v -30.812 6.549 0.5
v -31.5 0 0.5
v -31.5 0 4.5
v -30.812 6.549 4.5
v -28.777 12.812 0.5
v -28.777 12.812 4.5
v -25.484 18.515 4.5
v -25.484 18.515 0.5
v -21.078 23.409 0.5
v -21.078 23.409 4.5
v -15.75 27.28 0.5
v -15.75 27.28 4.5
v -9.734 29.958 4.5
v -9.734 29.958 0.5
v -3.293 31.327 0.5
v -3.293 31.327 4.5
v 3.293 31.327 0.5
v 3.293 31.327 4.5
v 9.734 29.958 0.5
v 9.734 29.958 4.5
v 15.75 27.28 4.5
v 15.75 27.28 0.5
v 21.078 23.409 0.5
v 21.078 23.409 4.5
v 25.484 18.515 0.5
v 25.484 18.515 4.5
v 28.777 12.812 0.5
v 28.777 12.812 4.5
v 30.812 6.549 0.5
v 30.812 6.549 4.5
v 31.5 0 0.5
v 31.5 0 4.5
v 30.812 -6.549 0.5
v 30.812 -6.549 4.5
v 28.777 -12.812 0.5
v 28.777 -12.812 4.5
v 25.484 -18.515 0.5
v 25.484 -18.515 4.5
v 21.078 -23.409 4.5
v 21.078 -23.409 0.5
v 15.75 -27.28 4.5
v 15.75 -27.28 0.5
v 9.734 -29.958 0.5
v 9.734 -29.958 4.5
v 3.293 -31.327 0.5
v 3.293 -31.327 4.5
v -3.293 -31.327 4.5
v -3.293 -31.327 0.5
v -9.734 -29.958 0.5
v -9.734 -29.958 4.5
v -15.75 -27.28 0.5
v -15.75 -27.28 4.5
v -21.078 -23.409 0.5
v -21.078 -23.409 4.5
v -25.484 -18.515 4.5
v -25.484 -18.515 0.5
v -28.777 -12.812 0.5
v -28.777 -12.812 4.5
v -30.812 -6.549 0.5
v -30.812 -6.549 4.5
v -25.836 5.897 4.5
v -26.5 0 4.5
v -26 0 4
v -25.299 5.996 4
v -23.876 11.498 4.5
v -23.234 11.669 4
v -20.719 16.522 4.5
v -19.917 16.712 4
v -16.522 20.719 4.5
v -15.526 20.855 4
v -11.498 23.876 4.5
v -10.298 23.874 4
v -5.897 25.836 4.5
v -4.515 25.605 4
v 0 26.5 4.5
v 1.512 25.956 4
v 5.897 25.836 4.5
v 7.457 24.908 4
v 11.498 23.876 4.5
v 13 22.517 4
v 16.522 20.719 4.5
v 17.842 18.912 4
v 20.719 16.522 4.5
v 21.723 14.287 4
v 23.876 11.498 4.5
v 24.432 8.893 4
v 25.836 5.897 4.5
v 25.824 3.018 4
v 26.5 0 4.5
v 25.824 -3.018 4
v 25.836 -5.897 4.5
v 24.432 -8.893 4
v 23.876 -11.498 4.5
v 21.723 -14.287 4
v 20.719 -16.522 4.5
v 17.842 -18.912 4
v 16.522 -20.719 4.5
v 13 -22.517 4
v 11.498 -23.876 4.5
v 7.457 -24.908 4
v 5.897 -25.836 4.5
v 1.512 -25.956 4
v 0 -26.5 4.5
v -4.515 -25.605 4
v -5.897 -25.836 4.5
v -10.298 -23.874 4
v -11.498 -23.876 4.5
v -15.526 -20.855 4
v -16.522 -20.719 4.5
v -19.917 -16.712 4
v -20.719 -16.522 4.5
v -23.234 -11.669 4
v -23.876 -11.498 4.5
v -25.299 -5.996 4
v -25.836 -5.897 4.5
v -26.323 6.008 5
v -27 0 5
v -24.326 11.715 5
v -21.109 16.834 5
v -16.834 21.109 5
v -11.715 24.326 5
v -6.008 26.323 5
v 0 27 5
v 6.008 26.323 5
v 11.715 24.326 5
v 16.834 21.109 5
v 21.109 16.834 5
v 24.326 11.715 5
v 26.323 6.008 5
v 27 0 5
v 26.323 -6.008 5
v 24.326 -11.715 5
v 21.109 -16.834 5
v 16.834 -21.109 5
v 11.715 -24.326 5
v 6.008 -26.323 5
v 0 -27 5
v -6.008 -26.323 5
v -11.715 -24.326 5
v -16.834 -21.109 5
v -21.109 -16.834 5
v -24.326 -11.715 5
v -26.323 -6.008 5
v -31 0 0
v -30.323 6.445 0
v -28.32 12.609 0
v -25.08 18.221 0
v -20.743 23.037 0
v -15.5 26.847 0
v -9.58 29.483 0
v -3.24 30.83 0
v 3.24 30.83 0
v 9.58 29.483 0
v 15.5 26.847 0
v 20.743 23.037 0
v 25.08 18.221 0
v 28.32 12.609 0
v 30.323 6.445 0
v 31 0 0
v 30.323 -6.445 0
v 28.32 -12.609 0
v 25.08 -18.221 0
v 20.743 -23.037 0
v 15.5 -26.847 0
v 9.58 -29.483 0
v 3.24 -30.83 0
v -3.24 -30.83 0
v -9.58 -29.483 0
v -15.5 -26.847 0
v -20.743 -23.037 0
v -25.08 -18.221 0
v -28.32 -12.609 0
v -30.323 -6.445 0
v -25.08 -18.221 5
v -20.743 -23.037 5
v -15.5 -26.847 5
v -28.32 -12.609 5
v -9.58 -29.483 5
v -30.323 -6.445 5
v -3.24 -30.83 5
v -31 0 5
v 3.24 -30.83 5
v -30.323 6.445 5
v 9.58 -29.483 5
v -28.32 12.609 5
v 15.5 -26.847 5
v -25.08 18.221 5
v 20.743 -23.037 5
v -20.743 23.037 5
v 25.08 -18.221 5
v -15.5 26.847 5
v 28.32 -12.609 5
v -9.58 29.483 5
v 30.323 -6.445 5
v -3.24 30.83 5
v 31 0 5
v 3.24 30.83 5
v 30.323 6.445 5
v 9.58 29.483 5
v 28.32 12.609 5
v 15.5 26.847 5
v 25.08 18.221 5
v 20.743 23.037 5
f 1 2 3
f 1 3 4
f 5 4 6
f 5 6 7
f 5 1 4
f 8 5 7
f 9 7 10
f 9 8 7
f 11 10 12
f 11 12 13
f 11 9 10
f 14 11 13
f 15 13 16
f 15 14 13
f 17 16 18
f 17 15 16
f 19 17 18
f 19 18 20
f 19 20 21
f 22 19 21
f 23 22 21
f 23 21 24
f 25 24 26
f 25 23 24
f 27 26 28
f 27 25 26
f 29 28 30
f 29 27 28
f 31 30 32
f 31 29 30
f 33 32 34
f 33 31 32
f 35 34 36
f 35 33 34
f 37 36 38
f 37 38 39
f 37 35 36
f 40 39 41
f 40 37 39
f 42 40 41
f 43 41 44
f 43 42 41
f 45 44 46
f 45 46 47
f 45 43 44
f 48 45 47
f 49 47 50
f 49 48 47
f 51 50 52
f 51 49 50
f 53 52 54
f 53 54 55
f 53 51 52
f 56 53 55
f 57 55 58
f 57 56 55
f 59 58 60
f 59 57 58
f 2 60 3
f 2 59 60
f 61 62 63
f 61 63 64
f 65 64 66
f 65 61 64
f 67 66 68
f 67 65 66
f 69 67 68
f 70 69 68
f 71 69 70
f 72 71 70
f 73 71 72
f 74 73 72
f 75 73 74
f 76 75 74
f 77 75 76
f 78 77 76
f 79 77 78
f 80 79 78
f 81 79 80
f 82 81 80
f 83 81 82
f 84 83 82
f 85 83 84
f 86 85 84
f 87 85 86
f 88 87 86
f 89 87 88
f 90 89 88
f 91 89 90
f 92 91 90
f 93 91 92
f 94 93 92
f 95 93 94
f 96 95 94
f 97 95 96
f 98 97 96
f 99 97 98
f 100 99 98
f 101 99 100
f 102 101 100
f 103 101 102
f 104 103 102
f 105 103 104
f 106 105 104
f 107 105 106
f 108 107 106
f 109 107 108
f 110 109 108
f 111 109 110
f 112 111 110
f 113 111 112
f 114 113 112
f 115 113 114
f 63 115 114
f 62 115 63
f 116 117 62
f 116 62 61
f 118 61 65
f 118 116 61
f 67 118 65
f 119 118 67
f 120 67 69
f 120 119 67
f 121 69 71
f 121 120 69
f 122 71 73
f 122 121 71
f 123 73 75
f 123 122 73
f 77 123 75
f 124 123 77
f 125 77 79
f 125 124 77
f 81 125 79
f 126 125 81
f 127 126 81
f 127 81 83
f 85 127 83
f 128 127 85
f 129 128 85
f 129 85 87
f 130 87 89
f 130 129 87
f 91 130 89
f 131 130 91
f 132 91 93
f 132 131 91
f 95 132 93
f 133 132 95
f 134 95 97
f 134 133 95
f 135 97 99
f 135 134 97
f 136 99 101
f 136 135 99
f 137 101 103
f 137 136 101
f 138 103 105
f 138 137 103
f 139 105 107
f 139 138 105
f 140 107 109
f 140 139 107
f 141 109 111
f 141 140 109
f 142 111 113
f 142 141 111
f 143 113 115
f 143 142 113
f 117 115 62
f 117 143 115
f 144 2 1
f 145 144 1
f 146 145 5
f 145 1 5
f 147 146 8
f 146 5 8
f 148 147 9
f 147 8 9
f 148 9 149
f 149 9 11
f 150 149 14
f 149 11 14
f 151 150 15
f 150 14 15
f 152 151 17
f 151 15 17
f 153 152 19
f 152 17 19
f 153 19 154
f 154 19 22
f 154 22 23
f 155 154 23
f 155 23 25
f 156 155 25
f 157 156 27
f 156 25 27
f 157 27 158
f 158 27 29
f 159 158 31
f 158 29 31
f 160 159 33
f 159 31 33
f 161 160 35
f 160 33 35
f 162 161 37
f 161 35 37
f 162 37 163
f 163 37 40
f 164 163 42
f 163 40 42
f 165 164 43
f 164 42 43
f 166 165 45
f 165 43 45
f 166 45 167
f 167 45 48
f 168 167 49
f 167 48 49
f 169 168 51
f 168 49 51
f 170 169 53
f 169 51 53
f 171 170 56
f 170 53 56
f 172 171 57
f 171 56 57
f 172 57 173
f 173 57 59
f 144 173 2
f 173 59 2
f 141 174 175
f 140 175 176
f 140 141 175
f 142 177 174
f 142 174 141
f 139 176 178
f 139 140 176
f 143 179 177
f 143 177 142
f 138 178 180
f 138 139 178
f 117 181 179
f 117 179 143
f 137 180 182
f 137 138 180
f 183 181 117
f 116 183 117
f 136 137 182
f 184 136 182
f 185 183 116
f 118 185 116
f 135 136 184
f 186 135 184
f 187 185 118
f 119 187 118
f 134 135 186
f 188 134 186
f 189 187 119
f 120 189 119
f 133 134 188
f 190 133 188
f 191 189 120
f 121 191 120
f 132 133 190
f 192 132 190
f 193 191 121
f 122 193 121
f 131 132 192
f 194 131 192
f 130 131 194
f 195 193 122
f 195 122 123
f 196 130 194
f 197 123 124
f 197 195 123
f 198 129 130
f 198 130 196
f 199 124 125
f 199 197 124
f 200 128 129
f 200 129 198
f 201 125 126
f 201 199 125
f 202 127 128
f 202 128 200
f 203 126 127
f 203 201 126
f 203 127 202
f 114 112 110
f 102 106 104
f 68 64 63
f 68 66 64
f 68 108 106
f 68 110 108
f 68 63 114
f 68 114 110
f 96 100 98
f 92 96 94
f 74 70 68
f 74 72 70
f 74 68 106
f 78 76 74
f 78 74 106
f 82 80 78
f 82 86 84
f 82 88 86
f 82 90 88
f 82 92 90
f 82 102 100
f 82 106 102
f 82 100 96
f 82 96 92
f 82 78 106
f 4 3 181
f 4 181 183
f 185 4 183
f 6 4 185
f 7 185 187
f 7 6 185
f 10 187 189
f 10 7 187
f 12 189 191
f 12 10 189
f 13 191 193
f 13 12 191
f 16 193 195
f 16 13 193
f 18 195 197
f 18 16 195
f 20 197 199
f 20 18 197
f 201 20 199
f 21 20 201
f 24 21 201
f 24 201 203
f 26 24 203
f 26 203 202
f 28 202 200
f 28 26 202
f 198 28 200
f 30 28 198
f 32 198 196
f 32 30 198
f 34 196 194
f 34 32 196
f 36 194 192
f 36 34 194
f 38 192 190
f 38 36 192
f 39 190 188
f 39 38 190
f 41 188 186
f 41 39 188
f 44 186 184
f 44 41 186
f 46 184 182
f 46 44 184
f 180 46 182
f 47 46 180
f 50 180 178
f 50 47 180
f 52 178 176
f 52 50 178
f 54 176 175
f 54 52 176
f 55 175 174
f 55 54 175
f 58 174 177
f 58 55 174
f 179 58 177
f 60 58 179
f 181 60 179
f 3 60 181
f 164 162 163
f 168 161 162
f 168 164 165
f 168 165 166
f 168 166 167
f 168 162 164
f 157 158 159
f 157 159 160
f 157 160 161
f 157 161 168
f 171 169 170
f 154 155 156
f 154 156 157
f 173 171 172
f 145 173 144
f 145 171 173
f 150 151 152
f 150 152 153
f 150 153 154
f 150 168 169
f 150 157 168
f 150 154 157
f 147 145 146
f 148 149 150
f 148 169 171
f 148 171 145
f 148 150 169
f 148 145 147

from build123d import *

# Parameters (mm, degrees)
F2_SIZE = 0.49999


# Not quite as in the source:
# - a fillet or chamfer is up to 0.001 mm smaller than in the source, because OpenCascade refuses the exact size


with BuildPart() as f1:
    # F0 (on Front) → F1 (revolve)
    with BuildSketch(Plane.XZ):
        Polygon((-31.5, 0), (0, 0), (0, 4), (-26.5, 4), (-26.5, 5), (-31.5, 5), align=None)
    revolve(axis=Axis((0, 0, 2), (0, 0, -1)))

    # F2 (size 0.5 in the source; OpenCascade refuses exactly that, so slightly less here)
    f2_edges = [f1.edges().sort_by_distance(p)[0] for p in [
        (26.5, 0, 4),
        (26.5, 0, 5),
        (31.5, 0, 5),
        (31.5, 0, 0),
    ]]
    chamfer(f2_edges, length=F2_SIZE)


solid = f1.part
